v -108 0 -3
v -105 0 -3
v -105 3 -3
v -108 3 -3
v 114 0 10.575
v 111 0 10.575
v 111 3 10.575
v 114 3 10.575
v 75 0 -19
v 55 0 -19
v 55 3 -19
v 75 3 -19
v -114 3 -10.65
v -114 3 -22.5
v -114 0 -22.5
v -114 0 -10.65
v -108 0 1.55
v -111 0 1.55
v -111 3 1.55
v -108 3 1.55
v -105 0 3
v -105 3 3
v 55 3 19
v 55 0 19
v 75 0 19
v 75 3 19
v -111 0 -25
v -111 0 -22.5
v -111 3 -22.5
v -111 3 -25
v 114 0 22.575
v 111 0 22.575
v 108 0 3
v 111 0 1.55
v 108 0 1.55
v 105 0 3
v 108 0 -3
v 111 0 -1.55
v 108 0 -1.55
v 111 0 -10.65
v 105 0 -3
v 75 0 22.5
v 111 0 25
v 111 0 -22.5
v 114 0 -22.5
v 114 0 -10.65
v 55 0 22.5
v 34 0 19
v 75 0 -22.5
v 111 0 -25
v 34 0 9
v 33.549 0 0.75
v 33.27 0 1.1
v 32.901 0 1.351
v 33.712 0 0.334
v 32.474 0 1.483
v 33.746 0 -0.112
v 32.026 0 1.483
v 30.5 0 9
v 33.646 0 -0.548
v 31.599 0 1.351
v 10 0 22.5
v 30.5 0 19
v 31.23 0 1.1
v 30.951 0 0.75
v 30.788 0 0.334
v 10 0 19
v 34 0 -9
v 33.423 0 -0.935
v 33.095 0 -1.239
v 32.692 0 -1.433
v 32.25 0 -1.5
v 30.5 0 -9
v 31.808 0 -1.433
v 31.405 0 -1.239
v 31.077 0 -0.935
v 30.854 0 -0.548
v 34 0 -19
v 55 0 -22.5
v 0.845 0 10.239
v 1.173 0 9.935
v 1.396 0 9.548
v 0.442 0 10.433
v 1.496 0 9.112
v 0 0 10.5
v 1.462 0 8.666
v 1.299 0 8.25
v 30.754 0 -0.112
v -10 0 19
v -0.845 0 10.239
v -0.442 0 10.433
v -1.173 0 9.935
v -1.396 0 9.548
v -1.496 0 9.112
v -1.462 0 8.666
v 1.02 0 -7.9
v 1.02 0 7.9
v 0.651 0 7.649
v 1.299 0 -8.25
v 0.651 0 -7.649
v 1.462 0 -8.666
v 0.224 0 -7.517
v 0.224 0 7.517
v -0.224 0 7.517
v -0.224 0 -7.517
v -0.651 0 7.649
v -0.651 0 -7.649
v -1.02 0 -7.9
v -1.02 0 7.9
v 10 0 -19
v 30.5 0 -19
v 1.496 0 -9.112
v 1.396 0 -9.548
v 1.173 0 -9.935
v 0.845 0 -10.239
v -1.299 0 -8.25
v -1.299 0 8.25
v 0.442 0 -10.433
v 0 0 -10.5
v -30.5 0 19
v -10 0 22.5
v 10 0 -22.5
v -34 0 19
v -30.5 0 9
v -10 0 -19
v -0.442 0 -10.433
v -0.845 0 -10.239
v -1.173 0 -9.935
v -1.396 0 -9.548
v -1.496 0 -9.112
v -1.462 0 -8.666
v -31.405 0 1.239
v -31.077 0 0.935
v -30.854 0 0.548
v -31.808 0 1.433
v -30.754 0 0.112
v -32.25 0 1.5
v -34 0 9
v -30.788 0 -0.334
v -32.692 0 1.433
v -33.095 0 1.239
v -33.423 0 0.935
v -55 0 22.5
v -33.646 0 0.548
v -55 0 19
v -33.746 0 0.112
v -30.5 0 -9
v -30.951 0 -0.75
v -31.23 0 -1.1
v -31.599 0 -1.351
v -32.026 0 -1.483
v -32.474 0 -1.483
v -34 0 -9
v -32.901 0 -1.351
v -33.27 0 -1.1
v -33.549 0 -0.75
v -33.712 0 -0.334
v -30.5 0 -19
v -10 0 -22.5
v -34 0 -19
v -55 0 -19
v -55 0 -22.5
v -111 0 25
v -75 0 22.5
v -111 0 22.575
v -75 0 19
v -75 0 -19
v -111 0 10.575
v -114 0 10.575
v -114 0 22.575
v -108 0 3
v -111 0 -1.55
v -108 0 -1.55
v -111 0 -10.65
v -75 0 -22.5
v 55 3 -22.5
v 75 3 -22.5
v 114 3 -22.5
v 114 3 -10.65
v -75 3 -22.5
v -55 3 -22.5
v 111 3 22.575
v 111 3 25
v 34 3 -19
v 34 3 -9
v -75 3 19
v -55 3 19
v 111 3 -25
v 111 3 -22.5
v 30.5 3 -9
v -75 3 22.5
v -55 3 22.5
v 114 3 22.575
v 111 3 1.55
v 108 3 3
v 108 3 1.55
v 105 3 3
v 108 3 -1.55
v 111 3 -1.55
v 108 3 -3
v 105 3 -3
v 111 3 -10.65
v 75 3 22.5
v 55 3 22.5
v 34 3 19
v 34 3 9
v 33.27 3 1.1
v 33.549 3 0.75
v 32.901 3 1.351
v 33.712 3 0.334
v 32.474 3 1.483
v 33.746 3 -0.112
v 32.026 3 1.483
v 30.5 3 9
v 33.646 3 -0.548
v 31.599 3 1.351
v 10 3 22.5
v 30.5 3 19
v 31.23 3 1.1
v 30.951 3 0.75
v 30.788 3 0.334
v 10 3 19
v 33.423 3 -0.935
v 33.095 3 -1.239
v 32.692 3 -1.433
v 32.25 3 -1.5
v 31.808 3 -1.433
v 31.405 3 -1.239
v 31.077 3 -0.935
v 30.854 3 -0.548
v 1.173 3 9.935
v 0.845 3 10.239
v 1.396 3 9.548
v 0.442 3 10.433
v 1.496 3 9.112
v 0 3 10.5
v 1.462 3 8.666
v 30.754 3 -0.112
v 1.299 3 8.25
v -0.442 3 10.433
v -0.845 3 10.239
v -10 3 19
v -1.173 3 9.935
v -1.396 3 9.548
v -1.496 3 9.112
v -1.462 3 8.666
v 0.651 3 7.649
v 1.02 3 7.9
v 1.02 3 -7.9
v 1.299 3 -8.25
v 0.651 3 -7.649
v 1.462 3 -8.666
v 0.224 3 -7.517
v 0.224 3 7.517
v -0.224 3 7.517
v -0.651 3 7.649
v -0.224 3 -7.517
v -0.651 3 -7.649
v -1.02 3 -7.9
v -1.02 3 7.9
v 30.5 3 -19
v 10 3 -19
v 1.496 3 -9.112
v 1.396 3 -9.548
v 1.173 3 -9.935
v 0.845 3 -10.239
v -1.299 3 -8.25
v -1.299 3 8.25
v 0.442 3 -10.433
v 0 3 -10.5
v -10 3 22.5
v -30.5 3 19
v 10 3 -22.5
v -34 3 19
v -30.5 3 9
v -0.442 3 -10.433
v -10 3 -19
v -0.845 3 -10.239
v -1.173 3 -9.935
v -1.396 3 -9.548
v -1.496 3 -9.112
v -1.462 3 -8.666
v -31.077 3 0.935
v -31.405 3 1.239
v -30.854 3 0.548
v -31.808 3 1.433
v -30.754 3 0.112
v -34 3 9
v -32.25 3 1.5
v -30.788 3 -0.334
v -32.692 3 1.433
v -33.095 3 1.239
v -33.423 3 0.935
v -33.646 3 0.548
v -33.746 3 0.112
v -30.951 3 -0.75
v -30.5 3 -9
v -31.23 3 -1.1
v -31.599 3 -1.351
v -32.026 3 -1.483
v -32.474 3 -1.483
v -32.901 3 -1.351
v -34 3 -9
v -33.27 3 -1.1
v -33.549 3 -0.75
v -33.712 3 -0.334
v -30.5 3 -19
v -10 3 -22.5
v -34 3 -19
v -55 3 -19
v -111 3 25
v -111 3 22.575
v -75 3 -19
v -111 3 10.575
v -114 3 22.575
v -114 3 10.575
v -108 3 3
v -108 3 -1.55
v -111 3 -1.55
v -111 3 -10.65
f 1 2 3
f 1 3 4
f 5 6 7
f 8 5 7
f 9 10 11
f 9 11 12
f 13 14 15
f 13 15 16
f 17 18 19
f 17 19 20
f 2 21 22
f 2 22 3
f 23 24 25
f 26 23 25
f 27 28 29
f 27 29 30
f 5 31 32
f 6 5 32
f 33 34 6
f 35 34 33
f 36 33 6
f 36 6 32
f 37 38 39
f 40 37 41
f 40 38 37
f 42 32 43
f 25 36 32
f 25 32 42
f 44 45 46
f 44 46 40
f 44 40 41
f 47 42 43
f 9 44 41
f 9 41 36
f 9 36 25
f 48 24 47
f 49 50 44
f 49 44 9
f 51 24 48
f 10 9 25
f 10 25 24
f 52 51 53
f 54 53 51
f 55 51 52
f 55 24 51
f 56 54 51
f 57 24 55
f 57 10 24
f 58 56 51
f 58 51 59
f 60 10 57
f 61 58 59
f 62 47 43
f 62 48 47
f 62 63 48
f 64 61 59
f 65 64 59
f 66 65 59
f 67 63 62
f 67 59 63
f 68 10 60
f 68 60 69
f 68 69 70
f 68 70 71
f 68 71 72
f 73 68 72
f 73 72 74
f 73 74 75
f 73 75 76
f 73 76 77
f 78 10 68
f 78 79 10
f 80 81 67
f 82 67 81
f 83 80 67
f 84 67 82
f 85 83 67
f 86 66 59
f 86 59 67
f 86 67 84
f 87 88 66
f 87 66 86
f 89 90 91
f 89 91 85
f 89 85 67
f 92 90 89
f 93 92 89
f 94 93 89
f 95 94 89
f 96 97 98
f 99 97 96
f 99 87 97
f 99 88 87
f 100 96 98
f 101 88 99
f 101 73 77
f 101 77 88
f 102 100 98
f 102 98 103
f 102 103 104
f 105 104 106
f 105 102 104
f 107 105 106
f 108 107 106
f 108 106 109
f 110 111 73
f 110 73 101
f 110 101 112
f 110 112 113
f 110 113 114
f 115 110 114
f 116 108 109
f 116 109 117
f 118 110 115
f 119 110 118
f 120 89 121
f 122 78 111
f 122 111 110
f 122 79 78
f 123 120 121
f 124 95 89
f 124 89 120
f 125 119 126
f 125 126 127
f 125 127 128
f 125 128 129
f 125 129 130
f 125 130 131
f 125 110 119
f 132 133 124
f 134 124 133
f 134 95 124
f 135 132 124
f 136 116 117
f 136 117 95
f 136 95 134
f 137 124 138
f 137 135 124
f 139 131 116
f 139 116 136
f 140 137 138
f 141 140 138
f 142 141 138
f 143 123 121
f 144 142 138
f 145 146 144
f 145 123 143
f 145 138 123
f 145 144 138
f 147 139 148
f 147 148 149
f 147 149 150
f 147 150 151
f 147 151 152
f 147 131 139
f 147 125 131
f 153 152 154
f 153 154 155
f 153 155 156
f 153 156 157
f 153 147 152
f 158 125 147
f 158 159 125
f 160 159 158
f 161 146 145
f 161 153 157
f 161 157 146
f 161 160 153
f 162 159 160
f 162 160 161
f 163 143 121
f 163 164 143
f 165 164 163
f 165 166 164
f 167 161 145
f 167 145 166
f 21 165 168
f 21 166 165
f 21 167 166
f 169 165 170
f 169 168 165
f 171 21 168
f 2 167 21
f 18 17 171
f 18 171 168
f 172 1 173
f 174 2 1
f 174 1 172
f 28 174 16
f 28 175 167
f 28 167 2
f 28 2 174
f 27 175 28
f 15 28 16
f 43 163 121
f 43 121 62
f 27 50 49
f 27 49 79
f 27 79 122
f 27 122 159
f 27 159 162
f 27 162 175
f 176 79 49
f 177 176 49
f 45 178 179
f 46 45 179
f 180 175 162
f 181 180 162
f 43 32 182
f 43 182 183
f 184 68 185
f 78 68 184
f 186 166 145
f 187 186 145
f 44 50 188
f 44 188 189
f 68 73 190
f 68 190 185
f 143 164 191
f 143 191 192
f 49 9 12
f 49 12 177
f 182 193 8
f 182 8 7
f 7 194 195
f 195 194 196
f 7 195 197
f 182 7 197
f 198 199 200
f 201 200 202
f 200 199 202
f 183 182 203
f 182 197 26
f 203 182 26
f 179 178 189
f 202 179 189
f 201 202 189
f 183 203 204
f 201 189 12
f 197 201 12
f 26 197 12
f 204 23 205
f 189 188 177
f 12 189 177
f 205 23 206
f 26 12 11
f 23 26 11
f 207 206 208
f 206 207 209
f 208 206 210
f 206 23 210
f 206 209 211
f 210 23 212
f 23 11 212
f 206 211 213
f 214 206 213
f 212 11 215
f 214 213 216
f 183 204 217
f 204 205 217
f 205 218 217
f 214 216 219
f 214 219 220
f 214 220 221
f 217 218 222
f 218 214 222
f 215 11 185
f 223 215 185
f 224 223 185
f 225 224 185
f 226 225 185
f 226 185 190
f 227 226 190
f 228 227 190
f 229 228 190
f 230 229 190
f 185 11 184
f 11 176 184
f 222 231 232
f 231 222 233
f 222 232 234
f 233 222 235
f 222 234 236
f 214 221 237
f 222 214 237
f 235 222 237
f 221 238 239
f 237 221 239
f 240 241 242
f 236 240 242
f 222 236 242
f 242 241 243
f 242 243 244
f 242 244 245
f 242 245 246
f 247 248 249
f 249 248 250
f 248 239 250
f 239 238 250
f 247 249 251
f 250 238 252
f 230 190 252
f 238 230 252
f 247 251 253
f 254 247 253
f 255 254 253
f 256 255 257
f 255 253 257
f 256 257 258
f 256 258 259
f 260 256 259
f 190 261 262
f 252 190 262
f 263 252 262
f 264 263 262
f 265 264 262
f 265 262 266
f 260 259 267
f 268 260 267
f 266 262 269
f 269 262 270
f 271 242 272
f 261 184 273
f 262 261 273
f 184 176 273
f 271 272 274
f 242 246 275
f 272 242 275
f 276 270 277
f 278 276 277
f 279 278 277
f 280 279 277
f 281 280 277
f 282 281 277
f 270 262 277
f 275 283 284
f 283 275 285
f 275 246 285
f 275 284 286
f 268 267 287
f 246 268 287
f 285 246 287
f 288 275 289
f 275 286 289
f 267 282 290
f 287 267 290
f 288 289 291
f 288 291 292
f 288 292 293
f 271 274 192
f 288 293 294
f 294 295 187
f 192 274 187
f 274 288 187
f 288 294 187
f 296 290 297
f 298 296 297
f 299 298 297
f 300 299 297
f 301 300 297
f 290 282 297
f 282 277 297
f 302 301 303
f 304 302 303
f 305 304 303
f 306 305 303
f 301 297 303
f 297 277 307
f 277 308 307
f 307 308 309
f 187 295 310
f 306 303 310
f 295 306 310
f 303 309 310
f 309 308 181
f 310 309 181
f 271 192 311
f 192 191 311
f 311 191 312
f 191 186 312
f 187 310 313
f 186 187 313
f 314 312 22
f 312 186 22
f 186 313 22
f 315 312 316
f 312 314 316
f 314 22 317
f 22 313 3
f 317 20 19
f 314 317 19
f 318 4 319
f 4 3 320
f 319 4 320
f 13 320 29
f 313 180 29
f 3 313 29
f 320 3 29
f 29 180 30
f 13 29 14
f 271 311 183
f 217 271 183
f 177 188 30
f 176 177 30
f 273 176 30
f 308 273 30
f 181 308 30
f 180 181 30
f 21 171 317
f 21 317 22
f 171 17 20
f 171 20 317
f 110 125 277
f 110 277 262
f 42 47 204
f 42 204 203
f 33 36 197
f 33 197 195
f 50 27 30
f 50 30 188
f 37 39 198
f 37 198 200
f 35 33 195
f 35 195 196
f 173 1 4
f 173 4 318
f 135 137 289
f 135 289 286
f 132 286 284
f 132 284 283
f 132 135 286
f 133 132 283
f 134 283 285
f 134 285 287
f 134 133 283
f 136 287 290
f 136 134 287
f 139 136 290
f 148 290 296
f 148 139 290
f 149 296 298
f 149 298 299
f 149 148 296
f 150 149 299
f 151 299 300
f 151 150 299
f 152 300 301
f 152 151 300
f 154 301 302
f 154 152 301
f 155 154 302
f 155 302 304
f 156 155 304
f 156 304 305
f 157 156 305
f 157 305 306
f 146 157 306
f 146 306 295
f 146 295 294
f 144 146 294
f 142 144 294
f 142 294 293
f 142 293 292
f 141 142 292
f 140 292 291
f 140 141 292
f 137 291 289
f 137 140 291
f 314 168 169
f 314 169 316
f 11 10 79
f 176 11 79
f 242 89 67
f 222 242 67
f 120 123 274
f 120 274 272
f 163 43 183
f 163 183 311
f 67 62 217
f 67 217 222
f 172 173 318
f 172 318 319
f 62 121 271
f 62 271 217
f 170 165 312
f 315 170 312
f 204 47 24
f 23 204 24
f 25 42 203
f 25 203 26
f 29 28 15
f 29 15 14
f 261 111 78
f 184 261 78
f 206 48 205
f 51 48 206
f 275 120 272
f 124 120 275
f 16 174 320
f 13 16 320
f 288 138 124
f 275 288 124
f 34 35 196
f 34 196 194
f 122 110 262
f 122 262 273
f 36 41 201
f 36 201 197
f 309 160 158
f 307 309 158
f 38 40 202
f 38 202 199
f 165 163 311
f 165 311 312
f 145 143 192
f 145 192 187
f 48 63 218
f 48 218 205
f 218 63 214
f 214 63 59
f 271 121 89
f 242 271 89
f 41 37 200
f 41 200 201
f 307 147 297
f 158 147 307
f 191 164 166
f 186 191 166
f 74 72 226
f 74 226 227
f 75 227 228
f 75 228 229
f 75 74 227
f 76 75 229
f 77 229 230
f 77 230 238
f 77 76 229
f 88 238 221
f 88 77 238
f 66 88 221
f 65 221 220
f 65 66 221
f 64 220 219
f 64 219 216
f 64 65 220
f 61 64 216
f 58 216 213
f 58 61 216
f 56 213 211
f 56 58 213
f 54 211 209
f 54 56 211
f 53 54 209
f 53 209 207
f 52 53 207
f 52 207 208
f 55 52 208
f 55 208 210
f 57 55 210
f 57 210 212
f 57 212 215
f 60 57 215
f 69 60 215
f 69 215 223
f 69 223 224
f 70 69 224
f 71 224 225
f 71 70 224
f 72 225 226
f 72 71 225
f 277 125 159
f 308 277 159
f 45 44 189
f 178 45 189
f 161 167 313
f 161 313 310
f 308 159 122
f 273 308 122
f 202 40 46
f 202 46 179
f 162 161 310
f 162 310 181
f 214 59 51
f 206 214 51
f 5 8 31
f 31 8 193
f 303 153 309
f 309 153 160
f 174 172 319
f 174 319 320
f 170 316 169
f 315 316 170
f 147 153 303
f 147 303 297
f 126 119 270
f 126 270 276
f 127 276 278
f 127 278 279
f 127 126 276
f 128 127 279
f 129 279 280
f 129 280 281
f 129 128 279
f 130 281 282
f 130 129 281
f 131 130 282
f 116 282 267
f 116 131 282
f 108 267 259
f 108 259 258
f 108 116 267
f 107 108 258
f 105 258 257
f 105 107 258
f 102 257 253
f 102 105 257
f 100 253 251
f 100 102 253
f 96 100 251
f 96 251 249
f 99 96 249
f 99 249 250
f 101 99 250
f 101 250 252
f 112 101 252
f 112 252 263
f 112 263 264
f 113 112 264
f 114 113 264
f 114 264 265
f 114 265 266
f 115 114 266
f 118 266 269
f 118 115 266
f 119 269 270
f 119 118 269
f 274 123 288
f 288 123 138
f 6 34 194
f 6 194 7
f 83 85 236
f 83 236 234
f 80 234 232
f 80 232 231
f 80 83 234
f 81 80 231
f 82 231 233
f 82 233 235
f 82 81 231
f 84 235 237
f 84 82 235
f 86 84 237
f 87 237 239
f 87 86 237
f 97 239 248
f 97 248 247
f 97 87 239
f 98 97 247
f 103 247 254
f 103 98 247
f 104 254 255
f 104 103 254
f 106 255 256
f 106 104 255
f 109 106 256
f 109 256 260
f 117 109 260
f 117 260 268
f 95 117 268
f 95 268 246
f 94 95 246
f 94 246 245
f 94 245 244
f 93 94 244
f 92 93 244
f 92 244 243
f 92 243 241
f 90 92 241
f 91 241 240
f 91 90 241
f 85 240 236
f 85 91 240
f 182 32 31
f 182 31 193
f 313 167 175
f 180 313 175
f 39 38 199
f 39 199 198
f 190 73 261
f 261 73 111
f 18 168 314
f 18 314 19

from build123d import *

# Parameters (mm, degrees)
CROQUIS1_R              = 1.5
CROQUIS1_W              = 20
CROQUIS1_H              = 3.5
CROQUIS1_W_2            = 3.5
CROQUIS1_H_2            = 10
SALIENTE_EXTRUIR1_DEPTH = 3
CROQUIS2_W              = 11.85
CROQUIS2_H              = 3
CROQUIS2_W_2            = 12
SALIENTE_EXTRUIR2_DEPTH = 3


with BuildPart() as part:
    # Croquis1 → Saliente-Extruir1 (new body)
    with BuildSketch(Plane(origin=(0, 0, 0), x_dir=(1, 0, 0), z_dir=(0, 1, 0))):
        Polygon((111, -25), (-111, -25), (-111, -1.55), (-108, -1.55), (-108, -3), (-105, -3), (-105, 3), (-108, 3), (-108, 1.55), (-111, 1.55), (-111, 25), (111, 25), (111, 1.55), (108, 1.55), (108, 3), (105, 3), (105, -3), (108, -3), (108, -1.55), (111, -1.55), align=None)
        with Locations(Location((-32.25, 0, 0), (0, 0, 270))):
            Circle(CROQUIS1_R, mode=Mode.SUBTRACT)
        with Locations(Location((32.25, 0, 0), (0, 0, 90))):
            Circle(CROQUIS1_R, mode=Mode.SUBTRACT)
        with Locations(Location((0, -9, 0), (0, 0, 270))):
            Circle(CROQUIS1_R, mode=Mode.SUBTRACT)
        with Locations(Location((0, 9, 0), (0, 0, 90))):
            Circle(CROQUIS1_R, mode=Mode.SUBTRACT)
        with Locations((65, 20.75)):
            Rectangle(CROQUIS1_W, CROQUIS1_H, mode=Mode.SUBTRACT)
        with Locations((0, 20.75)):
            Rectangle(CROQUIS1_W, CROQUIS1_H, mode=Mode.SUBTRACT)
        with Locations((-65, 20.75)):
            Rectangle(CROQUIS1_W, CROQUIS1_H, mode=Mode.SUBTRACT)
        with Locations((65, -20.75)):
            Rectangle(CROQUIS1_W, CROQUIS1_H, mode=Mode.SUBTRACT)
        with Locations((0, -20.75)):
            Rectangle(CROQUIS1_W, CROQUIS1_H, mode=Mode.SUBTRACT)
        with Locations((-65, -20.75)):
            Rectangle(CROQUIS1_W, CROQUIS1_H, mode=Mode.SUBTRACT)
        with Locations((-32.25, 14)):
            Rectangle(CROQUIS1_W_2, CROQUIS1_H_2, mode=Mode.SUBTRACT)
        with Locations((-32.25, -14)):
            Rectangle(CROQUIS1_W_2, CROQUIS1_H_2, mode=Mode.SUBTRACT)
        with Locations((32.25, 14)):
            Rectangle(CROQUIS1_W_2, CROQUIS1_H_2, mode=Mode.SUBTRACT)
        with Locations((32.25, -14)):
            Rectangle(CROQUIS1_W_2, CROQUIS1_H_2, mode=Mode.SUBTRACT)
    extrude(amount=SALIENTE_EXTRUIR1_DEPTH)

    # Croquis2 → Saliente-Extruir2 (add)
    with BuildSketch(Plane.ZY.offset(111)):
        with Locations((-16.575, 1.5)):
            Rectangle(CROQUIS2_W, CROQUIS2_H)
        with Locations((16.575, 1.5)):
            Rectangle(CROQUIS2_W_2, CROQUIS2_H)
    saliente_extruir2 = extrude(amount=SALIENTE_EXTRUIR2_DEPTH)

    # Simetría1: Saliente-Extruir2 across plane
    add(saliente_extruir2.mirror(Plane(origin=(0, 0, 0), x_dir=(0, 0, 1), z_dir=(1, 0, 0))))


solid = part.part
